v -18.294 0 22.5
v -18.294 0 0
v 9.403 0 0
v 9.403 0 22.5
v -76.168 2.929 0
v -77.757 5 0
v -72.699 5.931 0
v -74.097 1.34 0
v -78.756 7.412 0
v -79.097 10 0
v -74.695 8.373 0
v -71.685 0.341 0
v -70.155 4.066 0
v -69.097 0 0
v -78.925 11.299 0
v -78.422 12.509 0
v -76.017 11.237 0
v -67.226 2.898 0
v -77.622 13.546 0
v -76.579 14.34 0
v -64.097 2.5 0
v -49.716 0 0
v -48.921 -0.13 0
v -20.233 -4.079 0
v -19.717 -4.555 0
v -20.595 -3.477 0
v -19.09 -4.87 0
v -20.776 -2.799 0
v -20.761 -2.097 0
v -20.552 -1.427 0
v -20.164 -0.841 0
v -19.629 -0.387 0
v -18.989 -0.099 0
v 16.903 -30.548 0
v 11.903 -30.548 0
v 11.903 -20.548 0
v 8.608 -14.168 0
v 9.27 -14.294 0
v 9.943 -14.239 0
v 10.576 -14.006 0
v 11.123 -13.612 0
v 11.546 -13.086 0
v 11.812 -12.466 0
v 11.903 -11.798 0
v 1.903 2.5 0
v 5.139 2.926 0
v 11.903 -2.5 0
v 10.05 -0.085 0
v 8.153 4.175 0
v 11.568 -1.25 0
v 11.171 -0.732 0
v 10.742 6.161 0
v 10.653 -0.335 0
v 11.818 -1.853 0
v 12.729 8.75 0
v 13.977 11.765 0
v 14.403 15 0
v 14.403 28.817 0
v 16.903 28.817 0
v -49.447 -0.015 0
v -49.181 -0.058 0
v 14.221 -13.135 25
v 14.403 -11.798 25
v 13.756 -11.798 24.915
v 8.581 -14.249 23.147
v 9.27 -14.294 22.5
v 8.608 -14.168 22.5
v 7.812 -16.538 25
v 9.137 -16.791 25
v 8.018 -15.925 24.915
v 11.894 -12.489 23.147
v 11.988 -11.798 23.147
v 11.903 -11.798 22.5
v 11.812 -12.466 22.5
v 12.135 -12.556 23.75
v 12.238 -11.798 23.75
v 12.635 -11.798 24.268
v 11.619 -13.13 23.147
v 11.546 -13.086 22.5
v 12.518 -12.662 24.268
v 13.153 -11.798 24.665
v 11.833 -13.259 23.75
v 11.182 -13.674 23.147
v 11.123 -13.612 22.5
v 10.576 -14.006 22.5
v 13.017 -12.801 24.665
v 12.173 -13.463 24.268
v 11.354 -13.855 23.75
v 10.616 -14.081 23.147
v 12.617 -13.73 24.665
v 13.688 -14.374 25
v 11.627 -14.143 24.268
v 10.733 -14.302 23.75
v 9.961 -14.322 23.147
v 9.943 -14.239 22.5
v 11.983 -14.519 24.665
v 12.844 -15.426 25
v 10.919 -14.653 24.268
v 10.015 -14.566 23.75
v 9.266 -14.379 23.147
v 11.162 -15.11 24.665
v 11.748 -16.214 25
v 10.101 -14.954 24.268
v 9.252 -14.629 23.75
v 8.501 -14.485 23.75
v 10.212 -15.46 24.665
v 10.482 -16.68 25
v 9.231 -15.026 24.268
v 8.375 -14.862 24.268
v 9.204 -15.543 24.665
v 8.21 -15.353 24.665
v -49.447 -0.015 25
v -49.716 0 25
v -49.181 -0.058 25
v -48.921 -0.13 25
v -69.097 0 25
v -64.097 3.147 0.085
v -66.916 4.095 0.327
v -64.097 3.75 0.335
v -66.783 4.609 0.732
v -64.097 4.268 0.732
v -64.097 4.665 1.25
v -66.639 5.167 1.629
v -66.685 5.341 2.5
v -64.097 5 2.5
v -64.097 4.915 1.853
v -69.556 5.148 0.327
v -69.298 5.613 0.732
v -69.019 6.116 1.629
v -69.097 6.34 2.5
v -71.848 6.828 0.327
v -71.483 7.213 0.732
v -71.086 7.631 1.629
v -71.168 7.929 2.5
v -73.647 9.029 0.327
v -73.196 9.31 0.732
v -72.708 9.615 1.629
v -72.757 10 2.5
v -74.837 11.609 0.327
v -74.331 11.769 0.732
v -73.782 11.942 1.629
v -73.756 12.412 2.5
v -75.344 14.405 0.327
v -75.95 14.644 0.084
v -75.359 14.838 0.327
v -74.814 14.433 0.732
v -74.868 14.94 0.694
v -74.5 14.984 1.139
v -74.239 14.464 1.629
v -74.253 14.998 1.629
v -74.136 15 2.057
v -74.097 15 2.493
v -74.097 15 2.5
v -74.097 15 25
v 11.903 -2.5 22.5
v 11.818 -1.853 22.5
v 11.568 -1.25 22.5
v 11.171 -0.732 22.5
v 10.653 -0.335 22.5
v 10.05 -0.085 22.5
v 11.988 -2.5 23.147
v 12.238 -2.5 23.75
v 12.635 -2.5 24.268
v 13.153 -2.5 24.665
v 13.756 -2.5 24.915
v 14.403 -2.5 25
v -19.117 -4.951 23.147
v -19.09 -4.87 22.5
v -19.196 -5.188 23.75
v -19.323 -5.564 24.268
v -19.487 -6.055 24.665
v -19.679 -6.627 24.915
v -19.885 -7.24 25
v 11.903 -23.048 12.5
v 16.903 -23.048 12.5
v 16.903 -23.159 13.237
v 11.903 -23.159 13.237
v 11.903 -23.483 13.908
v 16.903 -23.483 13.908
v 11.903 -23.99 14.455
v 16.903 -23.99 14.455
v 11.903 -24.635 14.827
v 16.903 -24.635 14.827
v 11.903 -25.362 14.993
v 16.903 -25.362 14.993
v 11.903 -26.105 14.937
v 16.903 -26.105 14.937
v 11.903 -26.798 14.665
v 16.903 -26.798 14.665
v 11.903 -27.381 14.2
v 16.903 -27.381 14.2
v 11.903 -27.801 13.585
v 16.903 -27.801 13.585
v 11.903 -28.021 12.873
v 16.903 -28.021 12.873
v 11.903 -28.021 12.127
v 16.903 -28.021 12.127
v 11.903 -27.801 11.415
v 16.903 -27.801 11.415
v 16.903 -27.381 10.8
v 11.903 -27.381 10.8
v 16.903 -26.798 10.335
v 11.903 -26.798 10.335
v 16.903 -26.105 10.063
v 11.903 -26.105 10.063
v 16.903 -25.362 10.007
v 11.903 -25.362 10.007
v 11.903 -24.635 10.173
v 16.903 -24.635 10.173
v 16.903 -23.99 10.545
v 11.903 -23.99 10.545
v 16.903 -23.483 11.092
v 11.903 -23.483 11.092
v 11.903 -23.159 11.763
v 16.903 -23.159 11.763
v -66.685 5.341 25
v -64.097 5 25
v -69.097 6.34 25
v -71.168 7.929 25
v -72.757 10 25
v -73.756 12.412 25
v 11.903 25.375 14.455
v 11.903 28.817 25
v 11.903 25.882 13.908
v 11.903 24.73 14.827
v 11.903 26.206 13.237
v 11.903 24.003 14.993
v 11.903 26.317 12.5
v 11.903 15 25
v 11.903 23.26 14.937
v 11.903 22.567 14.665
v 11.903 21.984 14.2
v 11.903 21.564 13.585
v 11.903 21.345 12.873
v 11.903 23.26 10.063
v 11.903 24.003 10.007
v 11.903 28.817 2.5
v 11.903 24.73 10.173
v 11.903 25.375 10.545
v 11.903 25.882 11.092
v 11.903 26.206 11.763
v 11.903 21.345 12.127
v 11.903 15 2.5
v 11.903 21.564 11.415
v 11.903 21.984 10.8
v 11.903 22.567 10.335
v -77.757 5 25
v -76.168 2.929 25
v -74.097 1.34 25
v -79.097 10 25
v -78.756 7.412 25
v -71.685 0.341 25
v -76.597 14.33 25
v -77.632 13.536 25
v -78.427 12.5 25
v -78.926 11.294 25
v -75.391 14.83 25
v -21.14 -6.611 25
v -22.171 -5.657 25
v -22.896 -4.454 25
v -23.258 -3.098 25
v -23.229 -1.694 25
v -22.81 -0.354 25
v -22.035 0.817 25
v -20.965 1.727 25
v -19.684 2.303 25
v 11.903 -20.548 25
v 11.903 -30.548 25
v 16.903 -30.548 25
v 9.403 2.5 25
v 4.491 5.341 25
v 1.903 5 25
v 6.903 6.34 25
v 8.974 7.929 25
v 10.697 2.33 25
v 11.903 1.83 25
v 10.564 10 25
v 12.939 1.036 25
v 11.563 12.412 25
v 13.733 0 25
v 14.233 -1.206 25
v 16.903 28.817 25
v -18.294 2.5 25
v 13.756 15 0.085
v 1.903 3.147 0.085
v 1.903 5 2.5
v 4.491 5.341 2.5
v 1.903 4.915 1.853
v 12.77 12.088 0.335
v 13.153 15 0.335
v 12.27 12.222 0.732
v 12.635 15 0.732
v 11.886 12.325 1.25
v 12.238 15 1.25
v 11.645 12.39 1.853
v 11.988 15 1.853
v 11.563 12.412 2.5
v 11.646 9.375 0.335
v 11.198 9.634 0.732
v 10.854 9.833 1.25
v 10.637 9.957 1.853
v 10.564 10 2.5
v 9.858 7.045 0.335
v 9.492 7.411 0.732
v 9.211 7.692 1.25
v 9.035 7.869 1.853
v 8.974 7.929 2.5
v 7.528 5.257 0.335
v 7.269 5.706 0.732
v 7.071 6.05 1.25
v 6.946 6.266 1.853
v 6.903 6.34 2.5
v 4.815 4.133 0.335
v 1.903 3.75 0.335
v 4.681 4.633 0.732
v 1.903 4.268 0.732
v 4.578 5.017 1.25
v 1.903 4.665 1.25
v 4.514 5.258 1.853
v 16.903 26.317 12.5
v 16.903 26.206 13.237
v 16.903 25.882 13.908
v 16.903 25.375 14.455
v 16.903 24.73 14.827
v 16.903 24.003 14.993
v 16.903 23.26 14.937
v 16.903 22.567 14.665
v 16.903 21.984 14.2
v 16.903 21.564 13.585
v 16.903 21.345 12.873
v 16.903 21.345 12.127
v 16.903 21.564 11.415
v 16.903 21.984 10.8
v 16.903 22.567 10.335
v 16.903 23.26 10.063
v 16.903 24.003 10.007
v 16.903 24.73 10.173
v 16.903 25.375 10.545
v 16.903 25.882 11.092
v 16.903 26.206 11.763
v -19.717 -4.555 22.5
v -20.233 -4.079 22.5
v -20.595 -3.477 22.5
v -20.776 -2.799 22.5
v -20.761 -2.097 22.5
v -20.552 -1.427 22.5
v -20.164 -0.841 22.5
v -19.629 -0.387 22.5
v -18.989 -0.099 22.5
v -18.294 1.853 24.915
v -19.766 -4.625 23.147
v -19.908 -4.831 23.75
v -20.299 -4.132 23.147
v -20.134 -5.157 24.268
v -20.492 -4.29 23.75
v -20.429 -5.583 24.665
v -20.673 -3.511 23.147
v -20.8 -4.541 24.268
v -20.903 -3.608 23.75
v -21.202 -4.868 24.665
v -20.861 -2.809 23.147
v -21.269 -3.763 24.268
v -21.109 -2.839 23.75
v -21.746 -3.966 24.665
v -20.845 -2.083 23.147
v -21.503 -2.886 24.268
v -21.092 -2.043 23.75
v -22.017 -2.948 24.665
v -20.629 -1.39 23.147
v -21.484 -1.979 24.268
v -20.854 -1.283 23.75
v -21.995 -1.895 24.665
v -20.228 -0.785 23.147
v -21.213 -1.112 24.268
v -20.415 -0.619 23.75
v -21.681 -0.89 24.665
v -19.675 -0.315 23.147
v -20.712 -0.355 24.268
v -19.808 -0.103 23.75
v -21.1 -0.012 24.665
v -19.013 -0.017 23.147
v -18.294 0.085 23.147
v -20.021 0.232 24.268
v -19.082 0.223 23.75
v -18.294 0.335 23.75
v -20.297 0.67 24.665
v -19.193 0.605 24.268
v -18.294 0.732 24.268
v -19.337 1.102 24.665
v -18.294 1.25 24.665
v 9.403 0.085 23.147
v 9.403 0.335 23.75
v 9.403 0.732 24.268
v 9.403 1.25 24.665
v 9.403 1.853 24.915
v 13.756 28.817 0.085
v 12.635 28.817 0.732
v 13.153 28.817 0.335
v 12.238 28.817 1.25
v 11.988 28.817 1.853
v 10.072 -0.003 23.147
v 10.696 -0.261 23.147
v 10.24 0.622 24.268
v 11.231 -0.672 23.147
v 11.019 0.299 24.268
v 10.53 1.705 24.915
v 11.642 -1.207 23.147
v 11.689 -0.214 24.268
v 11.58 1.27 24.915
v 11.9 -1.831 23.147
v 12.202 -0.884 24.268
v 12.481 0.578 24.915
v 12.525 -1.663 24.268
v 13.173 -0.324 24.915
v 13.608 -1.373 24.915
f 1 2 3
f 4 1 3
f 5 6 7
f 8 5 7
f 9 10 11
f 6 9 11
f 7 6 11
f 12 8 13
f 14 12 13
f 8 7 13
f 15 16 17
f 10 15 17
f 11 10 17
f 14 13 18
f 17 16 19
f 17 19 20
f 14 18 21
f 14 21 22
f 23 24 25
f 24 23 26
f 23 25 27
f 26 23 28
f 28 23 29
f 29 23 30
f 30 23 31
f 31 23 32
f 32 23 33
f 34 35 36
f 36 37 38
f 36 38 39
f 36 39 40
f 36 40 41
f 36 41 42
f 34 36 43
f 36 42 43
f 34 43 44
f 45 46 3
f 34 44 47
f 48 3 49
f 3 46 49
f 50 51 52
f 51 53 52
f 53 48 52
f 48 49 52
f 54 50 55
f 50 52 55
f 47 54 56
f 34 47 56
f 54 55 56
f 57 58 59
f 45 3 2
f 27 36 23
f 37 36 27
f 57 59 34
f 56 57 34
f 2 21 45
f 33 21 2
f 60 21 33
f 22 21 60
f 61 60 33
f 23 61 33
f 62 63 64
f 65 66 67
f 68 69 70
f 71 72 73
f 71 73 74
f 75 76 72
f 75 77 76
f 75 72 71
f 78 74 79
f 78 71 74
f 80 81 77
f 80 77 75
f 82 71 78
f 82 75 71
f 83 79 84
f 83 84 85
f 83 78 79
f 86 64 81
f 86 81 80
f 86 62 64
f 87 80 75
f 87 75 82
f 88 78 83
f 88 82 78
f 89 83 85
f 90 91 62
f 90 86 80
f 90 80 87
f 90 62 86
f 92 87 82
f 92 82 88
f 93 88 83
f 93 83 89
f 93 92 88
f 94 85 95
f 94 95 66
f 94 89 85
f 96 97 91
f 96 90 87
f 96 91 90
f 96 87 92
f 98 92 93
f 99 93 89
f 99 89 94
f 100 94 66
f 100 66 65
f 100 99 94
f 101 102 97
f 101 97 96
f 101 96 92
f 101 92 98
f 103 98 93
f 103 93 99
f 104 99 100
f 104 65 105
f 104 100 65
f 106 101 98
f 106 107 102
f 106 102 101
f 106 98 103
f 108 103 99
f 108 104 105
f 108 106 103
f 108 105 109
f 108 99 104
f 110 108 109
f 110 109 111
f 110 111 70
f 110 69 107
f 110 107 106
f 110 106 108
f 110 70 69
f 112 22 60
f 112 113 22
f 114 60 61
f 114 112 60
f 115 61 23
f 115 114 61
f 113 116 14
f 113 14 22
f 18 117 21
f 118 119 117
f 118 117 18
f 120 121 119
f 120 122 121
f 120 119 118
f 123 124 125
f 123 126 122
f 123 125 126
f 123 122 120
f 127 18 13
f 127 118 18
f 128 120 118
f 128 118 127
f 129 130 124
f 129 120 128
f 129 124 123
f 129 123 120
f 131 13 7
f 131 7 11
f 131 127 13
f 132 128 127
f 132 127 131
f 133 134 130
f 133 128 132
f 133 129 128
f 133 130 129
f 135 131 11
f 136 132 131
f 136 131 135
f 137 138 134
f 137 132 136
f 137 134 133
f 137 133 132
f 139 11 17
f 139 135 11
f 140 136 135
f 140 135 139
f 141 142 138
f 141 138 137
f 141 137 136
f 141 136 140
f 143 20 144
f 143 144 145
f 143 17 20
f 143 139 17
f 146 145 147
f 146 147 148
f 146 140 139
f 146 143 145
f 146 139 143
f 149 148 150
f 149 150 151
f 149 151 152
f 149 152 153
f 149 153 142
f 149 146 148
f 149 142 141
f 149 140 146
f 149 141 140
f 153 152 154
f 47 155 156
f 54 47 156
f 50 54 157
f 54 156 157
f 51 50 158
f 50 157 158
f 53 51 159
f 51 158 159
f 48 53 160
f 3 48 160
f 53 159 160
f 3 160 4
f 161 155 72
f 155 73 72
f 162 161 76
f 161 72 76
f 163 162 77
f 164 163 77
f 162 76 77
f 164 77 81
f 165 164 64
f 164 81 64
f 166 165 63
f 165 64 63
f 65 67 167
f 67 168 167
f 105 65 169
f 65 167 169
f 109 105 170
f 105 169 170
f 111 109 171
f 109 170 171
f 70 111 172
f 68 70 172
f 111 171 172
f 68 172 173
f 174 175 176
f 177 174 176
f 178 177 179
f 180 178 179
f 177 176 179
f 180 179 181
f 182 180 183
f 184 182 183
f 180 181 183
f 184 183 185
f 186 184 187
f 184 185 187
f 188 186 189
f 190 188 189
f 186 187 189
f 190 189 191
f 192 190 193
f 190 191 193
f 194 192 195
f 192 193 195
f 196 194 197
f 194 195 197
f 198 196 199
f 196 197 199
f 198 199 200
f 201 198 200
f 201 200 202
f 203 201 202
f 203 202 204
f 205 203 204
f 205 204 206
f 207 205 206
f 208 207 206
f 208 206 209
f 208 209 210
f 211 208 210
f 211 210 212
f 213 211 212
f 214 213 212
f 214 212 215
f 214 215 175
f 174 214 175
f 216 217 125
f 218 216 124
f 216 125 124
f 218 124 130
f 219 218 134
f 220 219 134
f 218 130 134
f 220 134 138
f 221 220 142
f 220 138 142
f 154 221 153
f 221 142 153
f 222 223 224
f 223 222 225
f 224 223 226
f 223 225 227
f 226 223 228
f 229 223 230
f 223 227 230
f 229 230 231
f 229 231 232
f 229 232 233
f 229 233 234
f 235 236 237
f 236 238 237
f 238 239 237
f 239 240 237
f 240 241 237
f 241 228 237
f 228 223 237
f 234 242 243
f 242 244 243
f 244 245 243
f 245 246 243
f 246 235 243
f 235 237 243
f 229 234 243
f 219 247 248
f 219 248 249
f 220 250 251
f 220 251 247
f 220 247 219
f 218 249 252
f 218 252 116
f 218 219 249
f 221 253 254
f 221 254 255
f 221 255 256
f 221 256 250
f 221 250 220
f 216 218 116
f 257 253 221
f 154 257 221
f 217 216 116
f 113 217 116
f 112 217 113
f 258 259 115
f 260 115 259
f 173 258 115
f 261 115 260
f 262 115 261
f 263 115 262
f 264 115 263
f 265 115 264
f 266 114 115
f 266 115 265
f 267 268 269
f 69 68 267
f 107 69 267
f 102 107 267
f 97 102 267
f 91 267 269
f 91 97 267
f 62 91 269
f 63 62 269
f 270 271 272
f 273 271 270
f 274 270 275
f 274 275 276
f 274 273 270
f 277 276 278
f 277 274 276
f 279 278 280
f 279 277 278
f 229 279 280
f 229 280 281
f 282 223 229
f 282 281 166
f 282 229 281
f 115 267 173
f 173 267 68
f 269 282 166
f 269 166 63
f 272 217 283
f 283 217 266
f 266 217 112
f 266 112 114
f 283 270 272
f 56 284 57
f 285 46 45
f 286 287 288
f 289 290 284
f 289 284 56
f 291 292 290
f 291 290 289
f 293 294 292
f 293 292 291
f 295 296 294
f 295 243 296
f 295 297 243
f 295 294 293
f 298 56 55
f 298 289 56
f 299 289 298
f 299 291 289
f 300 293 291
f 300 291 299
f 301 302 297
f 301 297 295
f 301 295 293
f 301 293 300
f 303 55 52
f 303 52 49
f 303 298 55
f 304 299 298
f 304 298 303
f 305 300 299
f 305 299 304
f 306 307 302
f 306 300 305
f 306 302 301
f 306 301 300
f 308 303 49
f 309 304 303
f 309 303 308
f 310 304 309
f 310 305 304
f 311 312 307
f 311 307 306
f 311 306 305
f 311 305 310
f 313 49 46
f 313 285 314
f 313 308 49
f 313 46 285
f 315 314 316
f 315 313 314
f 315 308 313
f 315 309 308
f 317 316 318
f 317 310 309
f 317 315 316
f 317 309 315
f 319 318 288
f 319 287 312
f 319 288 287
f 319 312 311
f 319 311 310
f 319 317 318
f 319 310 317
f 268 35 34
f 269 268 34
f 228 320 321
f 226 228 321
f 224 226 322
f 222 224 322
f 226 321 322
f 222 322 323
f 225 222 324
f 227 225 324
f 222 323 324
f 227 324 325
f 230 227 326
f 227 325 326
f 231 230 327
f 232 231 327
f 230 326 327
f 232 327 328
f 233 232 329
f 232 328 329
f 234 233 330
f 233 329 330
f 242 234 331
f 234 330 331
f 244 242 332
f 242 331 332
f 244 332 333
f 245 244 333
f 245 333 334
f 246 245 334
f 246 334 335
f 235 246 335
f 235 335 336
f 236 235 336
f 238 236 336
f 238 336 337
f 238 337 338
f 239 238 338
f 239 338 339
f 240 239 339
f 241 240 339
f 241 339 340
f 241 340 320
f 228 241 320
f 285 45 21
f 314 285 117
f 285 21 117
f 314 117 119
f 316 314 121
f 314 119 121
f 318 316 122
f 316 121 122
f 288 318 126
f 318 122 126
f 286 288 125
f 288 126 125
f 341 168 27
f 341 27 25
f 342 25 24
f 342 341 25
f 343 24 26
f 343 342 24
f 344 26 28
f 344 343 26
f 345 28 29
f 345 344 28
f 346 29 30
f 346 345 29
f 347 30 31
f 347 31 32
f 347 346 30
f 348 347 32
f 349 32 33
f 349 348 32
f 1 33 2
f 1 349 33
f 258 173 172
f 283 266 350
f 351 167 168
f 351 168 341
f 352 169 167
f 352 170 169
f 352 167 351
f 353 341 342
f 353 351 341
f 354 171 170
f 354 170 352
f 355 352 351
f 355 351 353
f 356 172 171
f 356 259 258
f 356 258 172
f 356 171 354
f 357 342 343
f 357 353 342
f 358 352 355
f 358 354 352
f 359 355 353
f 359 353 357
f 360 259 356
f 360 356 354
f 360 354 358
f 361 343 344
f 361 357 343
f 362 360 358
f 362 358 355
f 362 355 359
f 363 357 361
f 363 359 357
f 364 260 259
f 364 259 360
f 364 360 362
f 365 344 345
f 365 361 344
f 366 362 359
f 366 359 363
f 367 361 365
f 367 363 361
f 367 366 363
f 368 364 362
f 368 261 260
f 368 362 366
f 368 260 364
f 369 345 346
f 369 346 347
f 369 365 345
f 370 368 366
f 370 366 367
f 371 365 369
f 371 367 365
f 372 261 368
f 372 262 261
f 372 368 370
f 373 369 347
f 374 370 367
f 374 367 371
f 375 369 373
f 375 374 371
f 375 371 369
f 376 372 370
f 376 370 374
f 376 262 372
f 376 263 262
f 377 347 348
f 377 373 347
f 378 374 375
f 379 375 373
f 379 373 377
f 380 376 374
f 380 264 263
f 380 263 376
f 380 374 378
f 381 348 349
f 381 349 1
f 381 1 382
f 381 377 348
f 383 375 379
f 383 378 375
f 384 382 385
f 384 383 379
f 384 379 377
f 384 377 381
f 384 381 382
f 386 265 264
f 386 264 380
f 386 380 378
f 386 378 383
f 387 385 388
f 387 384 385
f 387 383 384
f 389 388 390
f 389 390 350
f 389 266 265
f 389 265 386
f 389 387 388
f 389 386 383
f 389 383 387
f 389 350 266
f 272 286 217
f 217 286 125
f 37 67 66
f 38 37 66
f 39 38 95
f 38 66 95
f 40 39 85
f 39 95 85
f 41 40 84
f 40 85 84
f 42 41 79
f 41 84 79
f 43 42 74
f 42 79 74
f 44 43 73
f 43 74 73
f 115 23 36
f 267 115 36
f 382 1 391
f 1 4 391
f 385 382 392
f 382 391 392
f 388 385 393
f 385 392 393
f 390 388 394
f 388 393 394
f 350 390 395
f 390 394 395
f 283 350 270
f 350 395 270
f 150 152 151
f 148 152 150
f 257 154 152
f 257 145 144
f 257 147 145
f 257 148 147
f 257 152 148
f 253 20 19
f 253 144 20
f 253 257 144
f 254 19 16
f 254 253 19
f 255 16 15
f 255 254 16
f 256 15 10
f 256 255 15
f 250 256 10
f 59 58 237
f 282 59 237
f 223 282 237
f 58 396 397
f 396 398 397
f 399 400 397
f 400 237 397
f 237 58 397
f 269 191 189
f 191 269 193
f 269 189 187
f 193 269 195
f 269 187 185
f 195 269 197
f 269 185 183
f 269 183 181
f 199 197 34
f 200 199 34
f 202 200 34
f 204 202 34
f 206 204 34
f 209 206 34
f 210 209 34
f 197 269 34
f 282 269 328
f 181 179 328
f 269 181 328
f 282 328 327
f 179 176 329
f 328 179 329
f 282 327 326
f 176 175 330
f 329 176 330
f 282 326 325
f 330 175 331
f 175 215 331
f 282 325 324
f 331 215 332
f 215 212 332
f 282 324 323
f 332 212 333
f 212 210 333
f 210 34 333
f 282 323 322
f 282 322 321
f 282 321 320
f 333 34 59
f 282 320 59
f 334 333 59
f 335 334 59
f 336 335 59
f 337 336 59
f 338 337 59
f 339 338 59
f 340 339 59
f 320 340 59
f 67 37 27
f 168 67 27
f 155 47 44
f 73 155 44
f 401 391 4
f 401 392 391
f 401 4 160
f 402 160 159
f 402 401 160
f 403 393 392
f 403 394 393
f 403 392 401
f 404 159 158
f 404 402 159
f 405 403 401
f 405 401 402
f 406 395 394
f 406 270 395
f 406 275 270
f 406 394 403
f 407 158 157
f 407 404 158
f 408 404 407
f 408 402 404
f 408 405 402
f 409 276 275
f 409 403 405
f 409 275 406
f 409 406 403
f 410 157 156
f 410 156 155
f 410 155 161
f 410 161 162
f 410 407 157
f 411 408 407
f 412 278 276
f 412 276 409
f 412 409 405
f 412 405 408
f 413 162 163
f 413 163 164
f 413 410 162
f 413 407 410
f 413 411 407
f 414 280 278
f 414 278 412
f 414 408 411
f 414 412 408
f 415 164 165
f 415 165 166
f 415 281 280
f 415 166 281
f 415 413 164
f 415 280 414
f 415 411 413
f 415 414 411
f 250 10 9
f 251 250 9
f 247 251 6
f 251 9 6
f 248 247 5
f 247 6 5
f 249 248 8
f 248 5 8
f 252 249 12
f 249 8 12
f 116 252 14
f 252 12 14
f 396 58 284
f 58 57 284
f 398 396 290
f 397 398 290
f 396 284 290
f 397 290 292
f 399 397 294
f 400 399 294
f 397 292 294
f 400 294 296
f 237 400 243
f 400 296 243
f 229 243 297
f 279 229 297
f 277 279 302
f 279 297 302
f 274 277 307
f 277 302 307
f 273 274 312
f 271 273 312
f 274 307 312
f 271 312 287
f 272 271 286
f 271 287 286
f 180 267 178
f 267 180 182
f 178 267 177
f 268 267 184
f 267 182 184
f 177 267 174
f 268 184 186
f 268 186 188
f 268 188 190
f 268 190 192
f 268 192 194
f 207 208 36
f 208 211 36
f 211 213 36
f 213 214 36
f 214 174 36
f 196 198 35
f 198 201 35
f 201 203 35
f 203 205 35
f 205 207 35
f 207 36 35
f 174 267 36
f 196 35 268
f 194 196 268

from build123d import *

# Parameters (mm, degrees)
F1_DEPTH = 25
F2_R     = 2.5
F3_DEPTH = 25
F4_R     = 4.99999
F5_F1_R  = 2.5
F5_F2_R  = 2.5
F5_F3_R  = 2.5


# Not quite as in the source:
# - a fillet or chamfer is up to 0.001 mm smaller than in the source, because OpenCascade refuses the exact size
# - a feature names something its author has since deleted; it is built from what else it names


with BuildPart() as f1:
    # F0 (on Top) → F1 (new body)
    with BuildSketch(Plane.XY):
        with BuildLine():
            ThreePointArc((11.9032669473, 15), (8.9743347592, 7.9289321881), (1.9032669473, 5))
            Line((1.9032669473, 5), (-64.0967330527, 5))
            ThreePointArc((-64.0967330527, 5), (-71.1678008646, 7.9289321881), (-74.0967330527, 15))
            Line((-74.0967330527, 15), (-79.0967330527, 15))
            Line((-79.0967330527, 15), (-79.0967330527, 10))
            ThreePointArc((-79.0967330527, 10), (-76.1678008646, 2.9289321881), (-69.0967330527, 0))
            Line((-69.0967330527, 0), (-49.3079621117, 0))
            Line((-49.3079621117, 0), (11.9032669473, -20.5484238273))
            Line((11.9032669473, -20.5484238273), (11.9032669473, -30.5484238273))
            Line((11.9032669473, -30.5484238273), (16.9032669473, -30.5484238273))
            Line((16.9032669473, -30.5484238273), (16.9032669473, 15))
            Line((16.9032669473, 15), (16.9032669473, 28.8165863603))
            Line((16.9032669473, 28.8165863603), (11.9032669473, 28.8165863603))
            Line((11.9032669473, 28.8165863603), (11.9032669473, 15))
        make_face()
        Polygon((-33.5967330527, 0), (11.9032669473, 0), (11.9032669473, -15.2742119136), align=None, mode=Mode.SUBTRACT)
    extrude(amount=F1_DEPTH)

    # F2 (on face) → F3 (cut)
    with BuildSketch(Plane.YZ.offset(16.9032669473)):
        with Locations((-25.5484238273, 12.5)):
            Circle(F2_R)
        with Locations((23.8165863603, 12.5)):
            Circle(F2_R)
    extrude(amount=-F3_DEPTH, mode=Mode.SUBTRACT)

    # F4 (radius 5 in the source; OpenCascade refuses exactly that, so slightly less here)
    f4_edges = [f1.edges().sort_by_distance(p)[0] for p in [
        (-79.096733, 15, 12.5),
    ]]
    fillet(f4_edges, radius=F4_R)

    # F5: fillet of radius 2.5 on 10 edges, made by hand

    # F5_f1
    f5_f1_edges = [f1.edges().sort_by_distance(p)[0] for p in [
        (-33.5967330527, 0, 12.5),
        (11.9032669473, 0, 12.5),
        (11.9032669473, -15.2742119136, 12.5),
        (-49.3079621117, 0, 12.5),
    ]]
    fillet(f5_f1_edges, radius=F5_F1_R)

    # F5_f2
    f5_f2_edges = [f1.edges().sort_by_distance(p)[0] for p in [
        (8.9743347592, 7.9289321881, 0),
        (-71.1678008646, 7.9289321881, 0),
        (-31.0967330527, 5, 0),
        (11.9032669473, 21.9082931802, 0),
    ]]
    fillet(f5_f2_edges, radius=F5_F2_R)

    # F5_f3
    f5_f3_edges = [f1.edges().sort_by_distance(p)[0] for p in [
        (11.9032669473, -7.148931772, 25),
        (-4.4453294203, 0, 25),
        (-20.7612174023, -2.0969217328, 25),
        (11.1710339003, -0.732233047, 25),
        (10.8628862029, -13.8275215518, 25),
    ]]
    fillet(f5_f3_edges, radius=F5_F3_R)


solid = f1.part
